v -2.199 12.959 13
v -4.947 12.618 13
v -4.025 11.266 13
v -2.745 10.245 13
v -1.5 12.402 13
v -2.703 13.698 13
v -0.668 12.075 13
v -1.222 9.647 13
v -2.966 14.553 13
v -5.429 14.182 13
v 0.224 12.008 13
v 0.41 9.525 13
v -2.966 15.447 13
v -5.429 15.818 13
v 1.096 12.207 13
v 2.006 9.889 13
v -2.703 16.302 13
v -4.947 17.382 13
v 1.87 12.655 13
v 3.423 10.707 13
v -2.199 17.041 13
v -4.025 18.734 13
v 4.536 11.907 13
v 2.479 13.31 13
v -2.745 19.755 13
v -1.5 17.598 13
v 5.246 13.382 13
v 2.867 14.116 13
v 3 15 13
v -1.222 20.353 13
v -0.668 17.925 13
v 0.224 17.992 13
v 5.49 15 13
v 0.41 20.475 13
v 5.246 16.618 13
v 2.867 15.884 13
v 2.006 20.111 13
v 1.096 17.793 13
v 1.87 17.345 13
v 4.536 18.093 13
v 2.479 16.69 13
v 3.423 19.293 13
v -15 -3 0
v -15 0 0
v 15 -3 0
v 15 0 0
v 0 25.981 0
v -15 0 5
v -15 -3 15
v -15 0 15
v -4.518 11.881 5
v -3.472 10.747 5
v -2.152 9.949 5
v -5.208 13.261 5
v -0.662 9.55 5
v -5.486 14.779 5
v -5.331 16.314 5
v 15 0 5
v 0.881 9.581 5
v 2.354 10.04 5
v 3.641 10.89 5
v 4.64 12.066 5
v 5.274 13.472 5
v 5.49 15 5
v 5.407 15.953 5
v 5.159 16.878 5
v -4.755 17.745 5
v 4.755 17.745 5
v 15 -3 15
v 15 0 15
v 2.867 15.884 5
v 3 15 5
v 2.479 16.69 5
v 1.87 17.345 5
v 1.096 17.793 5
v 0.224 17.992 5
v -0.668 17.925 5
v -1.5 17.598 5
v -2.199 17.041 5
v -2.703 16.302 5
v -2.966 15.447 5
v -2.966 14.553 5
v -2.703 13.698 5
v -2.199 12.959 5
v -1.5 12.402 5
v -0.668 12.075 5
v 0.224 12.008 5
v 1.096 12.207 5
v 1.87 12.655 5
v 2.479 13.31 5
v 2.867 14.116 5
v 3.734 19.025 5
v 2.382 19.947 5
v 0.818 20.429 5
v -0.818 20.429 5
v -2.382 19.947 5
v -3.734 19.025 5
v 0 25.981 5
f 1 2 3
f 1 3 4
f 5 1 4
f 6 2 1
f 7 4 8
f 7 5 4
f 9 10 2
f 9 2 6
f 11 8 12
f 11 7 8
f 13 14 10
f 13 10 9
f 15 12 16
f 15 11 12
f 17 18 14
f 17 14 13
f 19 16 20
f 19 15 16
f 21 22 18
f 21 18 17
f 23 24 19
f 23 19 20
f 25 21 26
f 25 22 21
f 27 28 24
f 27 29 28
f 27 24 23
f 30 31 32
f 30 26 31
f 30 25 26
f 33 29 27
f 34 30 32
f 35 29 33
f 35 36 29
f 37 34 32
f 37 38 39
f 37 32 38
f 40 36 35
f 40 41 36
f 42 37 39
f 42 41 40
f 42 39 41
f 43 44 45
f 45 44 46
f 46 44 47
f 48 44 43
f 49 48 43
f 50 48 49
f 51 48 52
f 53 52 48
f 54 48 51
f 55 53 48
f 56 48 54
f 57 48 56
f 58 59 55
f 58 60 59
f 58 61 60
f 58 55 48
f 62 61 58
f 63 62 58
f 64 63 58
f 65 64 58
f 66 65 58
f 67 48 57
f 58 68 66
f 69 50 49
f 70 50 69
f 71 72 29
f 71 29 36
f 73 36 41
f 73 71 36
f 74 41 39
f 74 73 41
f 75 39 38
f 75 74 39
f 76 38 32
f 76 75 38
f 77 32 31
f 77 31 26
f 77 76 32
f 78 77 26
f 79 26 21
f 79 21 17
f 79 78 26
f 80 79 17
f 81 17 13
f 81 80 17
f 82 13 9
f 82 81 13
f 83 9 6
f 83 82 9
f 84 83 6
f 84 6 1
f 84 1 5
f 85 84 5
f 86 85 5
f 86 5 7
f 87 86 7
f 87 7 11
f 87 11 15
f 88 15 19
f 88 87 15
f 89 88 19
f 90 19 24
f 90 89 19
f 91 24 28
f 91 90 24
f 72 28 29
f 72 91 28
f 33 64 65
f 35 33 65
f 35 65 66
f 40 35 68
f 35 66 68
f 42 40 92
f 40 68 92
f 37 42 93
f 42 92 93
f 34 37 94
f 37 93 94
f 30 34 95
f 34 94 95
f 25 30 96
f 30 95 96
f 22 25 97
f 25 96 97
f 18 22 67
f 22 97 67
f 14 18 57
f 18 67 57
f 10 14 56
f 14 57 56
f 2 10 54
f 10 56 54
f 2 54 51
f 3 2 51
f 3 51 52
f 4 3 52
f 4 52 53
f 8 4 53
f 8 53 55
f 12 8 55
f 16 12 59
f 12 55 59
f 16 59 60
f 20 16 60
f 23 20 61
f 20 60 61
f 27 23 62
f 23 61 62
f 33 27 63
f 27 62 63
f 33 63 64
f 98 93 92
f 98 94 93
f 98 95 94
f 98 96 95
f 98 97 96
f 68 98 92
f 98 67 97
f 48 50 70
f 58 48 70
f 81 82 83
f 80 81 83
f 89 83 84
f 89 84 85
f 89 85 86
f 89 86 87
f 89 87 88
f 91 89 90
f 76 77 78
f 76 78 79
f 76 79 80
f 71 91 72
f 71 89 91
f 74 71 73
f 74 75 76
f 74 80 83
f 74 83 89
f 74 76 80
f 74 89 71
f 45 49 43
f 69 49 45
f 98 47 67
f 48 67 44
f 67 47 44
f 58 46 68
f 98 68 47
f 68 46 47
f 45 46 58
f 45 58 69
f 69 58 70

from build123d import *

# Parameters (mm, degrees)
F1_DEPTH = 5
F2_W     = 30
F2_H     = 15
F3_DEPTH = 3
F4_R     = 5.490381
F4_R_2   = 3
F5_DEPTH = 8


with BuildPart() as f1:
    # F0 (on Top) → F1 (new body)
    with BuildSketch(Plane.XY):
        Polygon((0, 25.980762), (-15, 0), (15, 0), align=None)
    extrude(amount=F1_DEPTH)

    # F2 (on face) → F3 (join)
    with BuildSketch(Plane.XZ):
        with Locations((0, 7.5)):
            Rectangle(F2_W, F2_H)
    extrude(amount=F3_DEPTH)

    # F4 (on face) → F5 (join)
    with BuildSketch(Plane.XY.offset(5)):
        with Locations((0, 15)):
            Circle(F4_R)
        with Locations((0, 15)):
            Circle(F4_R_2, mode=Mode.SUBTRACT)
    extrude(amount=F5_DEPTH)


solid = f1.part
